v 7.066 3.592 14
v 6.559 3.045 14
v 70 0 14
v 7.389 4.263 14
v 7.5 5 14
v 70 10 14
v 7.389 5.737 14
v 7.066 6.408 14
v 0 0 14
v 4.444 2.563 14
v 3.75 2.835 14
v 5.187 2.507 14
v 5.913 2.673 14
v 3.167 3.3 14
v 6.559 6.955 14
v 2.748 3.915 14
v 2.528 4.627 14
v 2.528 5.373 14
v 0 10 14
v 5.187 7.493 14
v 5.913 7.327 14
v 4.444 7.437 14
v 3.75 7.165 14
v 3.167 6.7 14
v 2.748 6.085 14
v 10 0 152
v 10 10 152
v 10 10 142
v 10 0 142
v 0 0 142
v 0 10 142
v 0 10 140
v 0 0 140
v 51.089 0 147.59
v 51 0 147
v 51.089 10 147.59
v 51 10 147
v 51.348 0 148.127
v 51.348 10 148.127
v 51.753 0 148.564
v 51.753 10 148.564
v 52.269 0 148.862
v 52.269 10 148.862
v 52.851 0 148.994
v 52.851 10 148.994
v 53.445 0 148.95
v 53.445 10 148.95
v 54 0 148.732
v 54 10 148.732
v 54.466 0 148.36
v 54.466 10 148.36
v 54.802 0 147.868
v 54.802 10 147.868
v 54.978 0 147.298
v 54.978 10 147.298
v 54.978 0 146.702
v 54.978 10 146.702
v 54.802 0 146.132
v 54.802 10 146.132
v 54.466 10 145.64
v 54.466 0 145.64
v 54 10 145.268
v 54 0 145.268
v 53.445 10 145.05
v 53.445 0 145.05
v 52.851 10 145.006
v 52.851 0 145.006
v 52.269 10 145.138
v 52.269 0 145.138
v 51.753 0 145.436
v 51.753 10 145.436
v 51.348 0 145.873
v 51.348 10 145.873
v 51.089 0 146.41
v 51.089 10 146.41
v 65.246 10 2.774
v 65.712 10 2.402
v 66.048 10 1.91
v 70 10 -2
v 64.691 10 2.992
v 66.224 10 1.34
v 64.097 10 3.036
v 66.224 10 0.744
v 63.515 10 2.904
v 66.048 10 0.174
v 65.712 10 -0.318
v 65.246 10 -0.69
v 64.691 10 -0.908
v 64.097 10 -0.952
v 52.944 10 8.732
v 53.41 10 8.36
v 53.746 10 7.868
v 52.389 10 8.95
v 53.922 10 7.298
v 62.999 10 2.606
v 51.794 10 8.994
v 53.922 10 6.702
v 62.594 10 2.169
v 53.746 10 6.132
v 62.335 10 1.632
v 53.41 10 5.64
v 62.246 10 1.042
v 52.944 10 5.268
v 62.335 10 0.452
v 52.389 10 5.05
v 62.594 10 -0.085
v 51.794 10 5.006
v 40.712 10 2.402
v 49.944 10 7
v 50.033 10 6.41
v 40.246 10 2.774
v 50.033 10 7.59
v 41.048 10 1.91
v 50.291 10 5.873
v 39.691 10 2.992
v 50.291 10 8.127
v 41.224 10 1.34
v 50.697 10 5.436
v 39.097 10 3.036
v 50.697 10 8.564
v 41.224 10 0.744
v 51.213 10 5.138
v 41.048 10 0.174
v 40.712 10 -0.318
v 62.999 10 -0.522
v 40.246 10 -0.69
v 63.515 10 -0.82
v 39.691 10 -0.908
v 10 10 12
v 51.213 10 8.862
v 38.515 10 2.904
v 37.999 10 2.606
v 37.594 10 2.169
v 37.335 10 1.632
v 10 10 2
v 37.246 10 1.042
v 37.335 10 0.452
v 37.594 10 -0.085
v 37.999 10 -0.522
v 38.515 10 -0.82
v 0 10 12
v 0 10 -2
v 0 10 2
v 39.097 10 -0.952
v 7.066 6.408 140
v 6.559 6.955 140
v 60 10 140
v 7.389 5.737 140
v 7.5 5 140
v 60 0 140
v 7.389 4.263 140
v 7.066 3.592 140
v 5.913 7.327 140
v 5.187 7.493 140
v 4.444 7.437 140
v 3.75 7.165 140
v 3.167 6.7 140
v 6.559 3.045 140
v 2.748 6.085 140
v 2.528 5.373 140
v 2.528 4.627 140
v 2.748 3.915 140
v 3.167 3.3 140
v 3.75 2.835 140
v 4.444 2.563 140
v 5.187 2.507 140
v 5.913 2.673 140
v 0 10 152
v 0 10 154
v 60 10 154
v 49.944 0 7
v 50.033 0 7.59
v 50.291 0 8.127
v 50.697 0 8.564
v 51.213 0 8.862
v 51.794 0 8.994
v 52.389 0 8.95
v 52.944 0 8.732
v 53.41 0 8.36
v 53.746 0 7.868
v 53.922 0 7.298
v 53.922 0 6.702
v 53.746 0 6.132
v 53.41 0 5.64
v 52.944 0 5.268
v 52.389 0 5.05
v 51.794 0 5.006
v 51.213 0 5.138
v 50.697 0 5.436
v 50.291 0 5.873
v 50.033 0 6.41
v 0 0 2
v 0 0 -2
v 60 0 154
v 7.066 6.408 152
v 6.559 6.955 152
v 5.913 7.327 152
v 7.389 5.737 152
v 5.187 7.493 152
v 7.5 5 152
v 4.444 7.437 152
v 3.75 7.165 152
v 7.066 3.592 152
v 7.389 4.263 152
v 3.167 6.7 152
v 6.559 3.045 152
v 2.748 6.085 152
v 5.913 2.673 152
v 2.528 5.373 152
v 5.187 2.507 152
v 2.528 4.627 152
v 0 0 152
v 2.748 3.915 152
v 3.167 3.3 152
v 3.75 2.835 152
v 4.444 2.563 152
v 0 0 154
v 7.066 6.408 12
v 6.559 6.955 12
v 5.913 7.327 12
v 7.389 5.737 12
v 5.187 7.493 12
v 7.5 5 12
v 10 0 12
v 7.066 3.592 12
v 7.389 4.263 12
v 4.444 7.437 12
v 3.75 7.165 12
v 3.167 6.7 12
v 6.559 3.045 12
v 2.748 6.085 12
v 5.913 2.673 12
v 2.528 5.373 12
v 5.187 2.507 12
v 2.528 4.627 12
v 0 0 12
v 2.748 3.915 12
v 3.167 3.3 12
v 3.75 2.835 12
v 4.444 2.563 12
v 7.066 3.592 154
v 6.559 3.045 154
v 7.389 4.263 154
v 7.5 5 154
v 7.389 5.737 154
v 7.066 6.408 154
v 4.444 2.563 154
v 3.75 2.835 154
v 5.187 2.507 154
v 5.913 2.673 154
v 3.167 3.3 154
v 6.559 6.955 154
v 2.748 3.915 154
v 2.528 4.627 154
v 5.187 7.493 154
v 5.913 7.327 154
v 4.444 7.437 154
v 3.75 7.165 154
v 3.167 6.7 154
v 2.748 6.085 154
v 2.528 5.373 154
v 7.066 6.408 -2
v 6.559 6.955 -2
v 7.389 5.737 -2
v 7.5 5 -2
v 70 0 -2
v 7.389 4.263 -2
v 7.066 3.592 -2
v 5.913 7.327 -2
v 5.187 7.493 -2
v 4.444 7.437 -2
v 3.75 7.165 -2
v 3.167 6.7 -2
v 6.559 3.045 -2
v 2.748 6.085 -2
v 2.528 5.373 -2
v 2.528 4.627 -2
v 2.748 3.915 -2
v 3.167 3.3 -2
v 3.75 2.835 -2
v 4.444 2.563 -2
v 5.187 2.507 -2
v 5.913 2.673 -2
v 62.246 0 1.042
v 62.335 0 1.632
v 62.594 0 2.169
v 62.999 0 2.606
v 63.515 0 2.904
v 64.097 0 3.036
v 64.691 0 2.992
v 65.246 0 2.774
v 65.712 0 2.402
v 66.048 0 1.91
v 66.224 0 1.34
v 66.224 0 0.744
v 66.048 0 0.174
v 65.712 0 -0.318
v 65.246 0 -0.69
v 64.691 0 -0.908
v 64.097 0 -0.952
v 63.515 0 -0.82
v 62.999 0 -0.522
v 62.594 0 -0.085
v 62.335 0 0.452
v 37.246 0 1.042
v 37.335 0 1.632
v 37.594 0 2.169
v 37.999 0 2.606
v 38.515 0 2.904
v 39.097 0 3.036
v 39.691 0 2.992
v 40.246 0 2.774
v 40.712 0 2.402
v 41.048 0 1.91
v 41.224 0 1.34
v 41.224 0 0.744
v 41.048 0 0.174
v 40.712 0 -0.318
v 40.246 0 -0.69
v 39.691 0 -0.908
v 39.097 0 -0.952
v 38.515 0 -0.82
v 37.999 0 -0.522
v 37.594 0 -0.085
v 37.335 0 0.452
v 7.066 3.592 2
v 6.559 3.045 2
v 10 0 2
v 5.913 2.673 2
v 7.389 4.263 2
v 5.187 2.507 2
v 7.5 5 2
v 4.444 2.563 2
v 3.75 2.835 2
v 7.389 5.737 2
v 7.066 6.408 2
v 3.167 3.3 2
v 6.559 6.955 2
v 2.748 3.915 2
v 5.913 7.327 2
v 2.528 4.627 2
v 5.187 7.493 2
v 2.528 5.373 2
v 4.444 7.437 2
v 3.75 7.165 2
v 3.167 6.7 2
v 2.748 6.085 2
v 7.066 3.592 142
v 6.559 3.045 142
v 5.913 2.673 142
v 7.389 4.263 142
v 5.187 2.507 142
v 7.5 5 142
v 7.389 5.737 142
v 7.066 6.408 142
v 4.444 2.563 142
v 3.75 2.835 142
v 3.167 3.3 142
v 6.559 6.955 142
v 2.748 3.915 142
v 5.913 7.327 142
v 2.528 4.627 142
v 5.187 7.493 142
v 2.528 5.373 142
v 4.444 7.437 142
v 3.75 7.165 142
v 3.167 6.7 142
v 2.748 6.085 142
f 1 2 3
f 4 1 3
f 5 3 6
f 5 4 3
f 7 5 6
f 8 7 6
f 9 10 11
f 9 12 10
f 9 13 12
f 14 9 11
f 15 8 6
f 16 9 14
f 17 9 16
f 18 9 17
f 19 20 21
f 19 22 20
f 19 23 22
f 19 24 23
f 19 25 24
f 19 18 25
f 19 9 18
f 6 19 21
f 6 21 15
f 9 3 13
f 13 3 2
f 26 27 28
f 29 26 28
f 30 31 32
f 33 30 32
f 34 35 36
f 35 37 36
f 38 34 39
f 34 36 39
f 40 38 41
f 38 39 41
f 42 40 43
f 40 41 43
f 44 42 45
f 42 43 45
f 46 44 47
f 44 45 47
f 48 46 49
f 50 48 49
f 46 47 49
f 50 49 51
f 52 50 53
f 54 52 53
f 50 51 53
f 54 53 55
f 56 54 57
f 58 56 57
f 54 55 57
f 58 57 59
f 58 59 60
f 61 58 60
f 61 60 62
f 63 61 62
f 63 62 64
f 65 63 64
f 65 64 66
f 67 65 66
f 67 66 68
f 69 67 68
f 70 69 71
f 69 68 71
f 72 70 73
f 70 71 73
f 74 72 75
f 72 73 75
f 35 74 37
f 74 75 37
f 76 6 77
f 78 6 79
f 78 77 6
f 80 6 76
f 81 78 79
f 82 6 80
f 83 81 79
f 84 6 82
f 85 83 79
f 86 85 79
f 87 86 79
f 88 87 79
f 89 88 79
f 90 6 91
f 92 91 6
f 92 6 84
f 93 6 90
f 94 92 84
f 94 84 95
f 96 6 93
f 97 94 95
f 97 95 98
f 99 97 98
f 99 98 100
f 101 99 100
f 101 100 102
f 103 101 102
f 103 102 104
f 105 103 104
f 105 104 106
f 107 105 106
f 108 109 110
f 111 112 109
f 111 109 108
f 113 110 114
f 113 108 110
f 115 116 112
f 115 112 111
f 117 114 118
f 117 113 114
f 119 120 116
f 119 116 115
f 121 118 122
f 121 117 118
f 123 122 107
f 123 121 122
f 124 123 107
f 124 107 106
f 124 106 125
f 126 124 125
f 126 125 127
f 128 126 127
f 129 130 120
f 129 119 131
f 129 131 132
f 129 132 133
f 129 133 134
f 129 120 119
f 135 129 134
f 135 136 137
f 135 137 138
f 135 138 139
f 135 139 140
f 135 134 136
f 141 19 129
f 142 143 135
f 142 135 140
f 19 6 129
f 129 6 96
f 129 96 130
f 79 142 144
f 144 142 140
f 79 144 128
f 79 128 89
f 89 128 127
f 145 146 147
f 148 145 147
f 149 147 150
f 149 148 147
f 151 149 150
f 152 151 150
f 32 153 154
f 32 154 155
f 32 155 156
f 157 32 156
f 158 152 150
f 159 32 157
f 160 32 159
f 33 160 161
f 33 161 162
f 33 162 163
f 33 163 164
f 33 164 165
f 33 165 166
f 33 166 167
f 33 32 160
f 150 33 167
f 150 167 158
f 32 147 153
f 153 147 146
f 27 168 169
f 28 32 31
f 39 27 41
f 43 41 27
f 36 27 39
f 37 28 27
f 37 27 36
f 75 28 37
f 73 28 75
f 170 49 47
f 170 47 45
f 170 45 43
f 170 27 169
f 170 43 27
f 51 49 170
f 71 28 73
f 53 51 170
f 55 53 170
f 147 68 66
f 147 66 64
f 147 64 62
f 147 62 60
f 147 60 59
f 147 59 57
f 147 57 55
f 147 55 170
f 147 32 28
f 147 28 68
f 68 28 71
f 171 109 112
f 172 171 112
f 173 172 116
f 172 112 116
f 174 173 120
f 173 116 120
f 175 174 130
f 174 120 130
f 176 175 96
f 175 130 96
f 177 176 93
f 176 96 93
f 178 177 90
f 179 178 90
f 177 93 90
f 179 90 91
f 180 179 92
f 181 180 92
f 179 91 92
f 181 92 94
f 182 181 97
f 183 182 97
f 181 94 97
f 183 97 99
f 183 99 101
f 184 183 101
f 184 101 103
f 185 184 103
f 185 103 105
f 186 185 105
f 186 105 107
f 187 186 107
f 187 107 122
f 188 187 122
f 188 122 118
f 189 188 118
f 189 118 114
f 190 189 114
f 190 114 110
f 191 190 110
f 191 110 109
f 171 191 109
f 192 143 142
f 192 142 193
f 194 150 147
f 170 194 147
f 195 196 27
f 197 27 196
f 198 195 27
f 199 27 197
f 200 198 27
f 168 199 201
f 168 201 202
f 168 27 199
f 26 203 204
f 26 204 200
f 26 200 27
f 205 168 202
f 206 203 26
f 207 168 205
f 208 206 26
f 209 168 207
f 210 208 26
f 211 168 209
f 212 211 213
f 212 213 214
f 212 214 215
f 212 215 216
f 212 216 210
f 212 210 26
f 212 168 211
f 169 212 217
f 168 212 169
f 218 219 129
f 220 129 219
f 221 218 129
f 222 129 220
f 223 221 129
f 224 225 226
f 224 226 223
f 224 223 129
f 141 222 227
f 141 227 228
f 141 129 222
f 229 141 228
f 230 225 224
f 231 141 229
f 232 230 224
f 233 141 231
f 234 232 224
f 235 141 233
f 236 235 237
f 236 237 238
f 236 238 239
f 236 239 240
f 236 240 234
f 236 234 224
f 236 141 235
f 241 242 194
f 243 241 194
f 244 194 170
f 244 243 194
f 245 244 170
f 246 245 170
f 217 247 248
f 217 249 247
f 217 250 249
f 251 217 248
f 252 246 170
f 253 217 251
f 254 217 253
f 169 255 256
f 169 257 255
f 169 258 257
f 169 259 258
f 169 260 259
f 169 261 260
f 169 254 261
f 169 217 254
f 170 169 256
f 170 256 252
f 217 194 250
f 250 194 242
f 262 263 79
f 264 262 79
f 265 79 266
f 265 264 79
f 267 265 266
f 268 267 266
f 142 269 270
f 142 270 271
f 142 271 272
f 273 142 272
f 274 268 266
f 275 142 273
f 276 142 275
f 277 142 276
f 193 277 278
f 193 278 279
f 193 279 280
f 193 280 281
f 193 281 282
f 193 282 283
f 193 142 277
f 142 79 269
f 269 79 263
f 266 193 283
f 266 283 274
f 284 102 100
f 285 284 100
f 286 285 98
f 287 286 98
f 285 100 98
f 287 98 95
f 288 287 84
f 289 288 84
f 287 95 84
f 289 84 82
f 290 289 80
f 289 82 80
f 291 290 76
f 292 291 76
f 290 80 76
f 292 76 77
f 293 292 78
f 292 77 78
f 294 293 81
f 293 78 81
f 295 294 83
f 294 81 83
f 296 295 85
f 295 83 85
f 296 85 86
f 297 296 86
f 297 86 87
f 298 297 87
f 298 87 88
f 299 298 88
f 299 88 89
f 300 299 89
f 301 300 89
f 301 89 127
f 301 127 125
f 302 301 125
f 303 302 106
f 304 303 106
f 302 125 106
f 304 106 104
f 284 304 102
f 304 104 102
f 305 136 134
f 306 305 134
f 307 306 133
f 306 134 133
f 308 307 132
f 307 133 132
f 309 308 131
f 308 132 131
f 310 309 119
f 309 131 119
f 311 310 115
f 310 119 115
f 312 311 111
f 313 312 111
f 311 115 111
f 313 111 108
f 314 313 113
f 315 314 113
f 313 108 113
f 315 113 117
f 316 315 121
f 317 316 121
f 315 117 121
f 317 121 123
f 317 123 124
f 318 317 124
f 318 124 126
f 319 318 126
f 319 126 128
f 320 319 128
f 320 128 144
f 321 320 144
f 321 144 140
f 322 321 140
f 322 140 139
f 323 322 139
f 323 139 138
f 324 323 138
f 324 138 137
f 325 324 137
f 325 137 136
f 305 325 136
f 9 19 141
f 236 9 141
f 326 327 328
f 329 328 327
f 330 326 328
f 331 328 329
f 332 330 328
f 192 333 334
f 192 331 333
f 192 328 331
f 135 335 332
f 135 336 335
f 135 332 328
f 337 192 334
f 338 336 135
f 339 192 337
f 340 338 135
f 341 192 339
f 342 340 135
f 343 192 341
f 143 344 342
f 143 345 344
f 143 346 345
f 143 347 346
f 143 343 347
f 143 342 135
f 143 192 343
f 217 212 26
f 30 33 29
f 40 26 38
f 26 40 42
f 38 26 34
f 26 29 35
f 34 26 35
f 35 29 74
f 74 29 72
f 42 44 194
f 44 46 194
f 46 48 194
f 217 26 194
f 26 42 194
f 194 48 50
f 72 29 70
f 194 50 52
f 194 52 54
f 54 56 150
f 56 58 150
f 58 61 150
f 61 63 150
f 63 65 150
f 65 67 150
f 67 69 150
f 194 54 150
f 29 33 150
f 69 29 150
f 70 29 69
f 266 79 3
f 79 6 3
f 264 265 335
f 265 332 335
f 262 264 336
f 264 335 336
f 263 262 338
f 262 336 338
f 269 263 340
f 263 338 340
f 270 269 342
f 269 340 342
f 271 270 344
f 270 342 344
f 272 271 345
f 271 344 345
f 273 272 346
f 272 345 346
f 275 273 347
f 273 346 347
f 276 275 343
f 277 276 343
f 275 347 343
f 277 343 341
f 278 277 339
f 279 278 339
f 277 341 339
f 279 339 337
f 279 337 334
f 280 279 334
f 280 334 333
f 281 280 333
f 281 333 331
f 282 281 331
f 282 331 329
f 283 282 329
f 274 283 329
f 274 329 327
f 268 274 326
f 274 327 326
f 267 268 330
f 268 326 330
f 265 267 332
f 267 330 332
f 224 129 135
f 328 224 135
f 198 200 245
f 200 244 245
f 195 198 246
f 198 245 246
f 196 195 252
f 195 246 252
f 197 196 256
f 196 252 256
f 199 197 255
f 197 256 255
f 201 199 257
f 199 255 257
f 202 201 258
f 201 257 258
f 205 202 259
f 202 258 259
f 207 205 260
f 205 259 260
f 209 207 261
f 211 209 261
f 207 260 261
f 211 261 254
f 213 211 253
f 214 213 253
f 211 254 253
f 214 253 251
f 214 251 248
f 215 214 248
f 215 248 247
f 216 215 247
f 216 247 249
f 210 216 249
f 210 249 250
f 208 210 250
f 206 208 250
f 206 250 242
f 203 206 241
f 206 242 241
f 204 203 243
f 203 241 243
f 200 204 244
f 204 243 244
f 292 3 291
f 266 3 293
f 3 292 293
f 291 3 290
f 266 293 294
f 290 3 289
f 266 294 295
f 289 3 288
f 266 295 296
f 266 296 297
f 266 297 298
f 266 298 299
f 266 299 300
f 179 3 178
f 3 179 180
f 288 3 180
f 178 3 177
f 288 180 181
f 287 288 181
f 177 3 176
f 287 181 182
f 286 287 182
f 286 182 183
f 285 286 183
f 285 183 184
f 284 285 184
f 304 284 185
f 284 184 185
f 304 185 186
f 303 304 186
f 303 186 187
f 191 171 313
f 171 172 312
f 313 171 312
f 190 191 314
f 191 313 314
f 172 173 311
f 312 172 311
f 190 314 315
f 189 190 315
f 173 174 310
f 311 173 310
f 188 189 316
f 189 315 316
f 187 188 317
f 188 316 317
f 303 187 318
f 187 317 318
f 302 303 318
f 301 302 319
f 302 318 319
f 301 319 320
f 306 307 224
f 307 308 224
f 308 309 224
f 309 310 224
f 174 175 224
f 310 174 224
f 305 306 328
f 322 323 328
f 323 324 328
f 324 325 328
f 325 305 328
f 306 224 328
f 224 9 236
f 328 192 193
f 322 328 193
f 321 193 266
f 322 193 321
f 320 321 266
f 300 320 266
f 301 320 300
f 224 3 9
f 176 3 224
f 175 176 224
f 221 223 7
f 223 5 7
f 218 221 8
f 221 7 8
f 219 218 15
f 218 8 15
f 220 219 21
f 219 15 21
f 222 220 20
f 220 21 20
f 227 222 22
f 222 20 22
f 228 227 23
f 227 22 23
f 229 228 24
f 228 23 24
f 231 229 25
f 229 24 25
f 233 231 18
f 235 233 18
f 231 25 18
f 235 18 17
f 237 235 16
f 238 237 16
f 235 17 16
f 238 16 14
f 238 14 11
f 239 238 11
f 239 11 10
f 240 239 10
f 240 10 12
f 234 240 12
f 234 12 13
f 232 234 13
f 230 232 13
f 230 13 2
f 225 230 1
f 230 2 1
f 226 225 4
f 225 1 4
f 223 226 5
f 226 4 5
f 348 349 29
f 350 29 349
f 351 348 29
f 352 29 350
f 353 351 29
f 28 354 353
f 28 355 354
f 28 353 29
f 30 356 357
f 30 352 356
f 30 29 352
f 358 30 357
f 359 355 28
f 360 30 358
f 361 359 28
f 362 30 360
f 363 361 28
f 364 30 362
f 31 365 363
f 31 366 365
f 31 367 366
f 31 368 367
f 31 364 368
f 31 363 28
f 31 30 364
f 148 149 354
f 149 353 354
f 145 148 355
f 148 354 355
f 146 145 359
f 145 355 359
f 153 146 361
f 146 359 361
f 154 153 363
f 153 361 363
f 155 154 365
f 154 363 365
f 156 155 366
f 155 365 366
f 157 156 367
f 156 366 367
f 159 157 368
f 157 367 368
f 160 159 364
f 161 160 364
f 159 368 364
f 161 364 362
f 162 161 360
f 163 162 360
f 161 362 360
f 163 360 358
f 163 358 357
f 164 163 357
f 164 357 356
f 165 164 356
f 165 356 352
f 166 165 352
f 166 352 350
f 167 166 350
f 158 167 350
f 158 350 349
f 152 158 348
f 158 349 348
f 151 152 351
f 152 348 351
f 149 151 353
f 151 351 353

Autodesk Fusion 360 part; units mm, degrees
sketch "Sketch1" plane through (0, 0, 0) normal (1, 0, 0) x (0, 0, -1)
  line L0 (0, 0) -> (-154, 0)
  line L1 (-154, 0) -> (-154, 10)
  line L2 (-154, 10) -> (0, 10)
  line L3 (0, 10) -> (0, 0)
  line L4 (-154, 10) -> (-140, 10)
  line L5 (-140, 10) -> (-140, 0)
  line L6 (-140, 0) -> (-154, 0)
  line L7 (-154, 0) -> (-154, 10)
  line L8 (0, 10) -> (-14, 10)
  line L9 (-14, 10) -> (-14, 0)
  line L10 (-14, 0) -> (0, 0)
  line L11 (0, 0) -> (0, 10)
  line L12 (-142, 10) -> (-152, 10)
  line L13 (-152, 10) -> (-152, 0)
  line L14 (-152, 0) -> (-142, 0)
  line L15 (-142, 0) -> (-142, 10)
  line L16 (-142, 10) -> (-152, 0) construction
  line L17 (-152, 10) -> (-142, 0) construction
  line L18 (-2, 10) -> (-12, 10)
  line L19 (-12, 10) -> (-12, 0)
  line L20 (-12, 0) -> (-2, 0)
  line L21 (-2, 0) -> (-2, 10)
  line L22 (-2, 10) -> (-12, 0) construction
  line L23 (-12, 10) -> (-2, 0) construction
  point P0 (-147, 5)
  point P1 (-7, 5)
  dimension "d2" = 10
  dimension "d3" = 14
  dimension "d4" = 10
  dimension "d5" = 14
  dimension "d6" = 10
  dimension "d7" = 10
  dimension "d8" = 10
  dimension "d9" = 10
  dimension "d10" = 10
  dimension "d11" = 2
  dimension "d12" = 2
  dimension "d38" = 10
  dimension "d39" = 10
  dimension "d40" = 126
extrude "Extrude1" add sketch "Sketch1" along normal blind 60 makes body 1
extrude "Extrude2" cut sketch "Sketch1" along normal blind 90 contours L0 L2 L5 L9 bodies 1 makes body 2 at (20, 0, 144.6667)
extrude "Extrude3" cut sketch "Sketch1" along normal blind 10 contours L0 L2 L8 L10 L18 L19 L20 L21 | L0 L2 L4 L6 L12 L13 L14 L15 bodies 1 2
sketch "Sketch4" plane through (0, 0, 154) normal (0, 0, 1) x (1, 0, 0)
  line L0 (0, 10) -> (0, 0)
  line L1 (0, 0) -> (60, 0)
  line L2 (60, 0) -> (60, 10)
  line L3 (60, 10) -> (0, 10)
  circle A0 centre (5, 5) radius 2.5
  dimension "d42" = 5
extrude "Extrude9" cut sketch "Sketch4" against normal blind 180 contours A0 bodies 1 2
sketch "Sketch5" plane through (0, 10, 0) normal (0, 1, 0) x (-1, 0, 0)
  line L0 (0, 2) -> (-10, 2)
  line L1 (-10, 2) -> (-10, 12)
  line L2 (-10, 12) -> (0, 12)
  line L3 (0, 12) -> (0, 14)
  line L4 (0, 14) -> (-60, 14)
  line L5 (-60, 14) -> (-60, 0)
  line L6 (-60, 0) -> (0, 0)
  line L7 (0, 0) -> (0, 2)
  circle A0 centre (-51.9439, 7) radius 2
  line L8 (-51.9439, 7) -> (-53, 147)
  circle A1 centre (-53, 147) radius 2
  dimension "d45" = 4
  dimension "d46" = 4
extrude "Extrude10" cut sketch "Sketch5" against normal blind 32 contours A0 | A1 bodies 1 2
extrude "Extrude11" add 1 faces at (42.5, 5, 154) along direction (0, 0, 1) blind 2 on bodies 2 bodies 2
extrude "Extrude12" cut 1 faces at (42.5, 5, 156) along direction (0, 0, -1) blind 2 on bodies 2 bodies 2
extrude "Extrude13" add 1 faces at (42.5, 5, 0) along direction (0, 0, -1) blind 2 on bodies 1 bodies 1
extrude "Extrude14" add 1 faces at (60, 3.3333, 3.3333) along direction (1, 0, 0) blind 10 on bodies 1 bodies 1
sketch "Sketch6" plane through (0, 10, 0) normal (0, 1, 0) x (-1, 0, 0)
  circle A0 centre (-51.9439, 7) radius 2
  line L0 (0, 2) -> (-10, 2)
  line L1 (-10, 2) -> (-10, 12)
  line L2 (-10, 12) -> (0, 12)
  line L3 (0, 12) -> (0, 14)
  line L4 (0, 14) -> (-70, 14)
  line L5 (-70, 14) -> (-70, -2)
  line L6 (-70, -2) -> (0, -2)
  line L7 (0, -2) -> (0, 2)
  line L8 (-70, -2) -> (-60, -2)
  line L9 (-60, -2) -> (-39.246, -2)
  line L10 (-39.246, -2) -> (-39.246, 1.042)
  circle A1 centre (-39.246, 1.042) radius 2
  line L11 (-39.246, 1.042) -> (-64.246, 1.042)
  circle A2 centre (-64.246, 1.042) radius 2
  dimension "d57" = 10
  dimension "d59" = 3.042
  dimension "d60" = 4
  dimension "d61" = 25
  dimension "d62" = 4
  dimension "d65" = 5.754
extrude "Extrude15" cut sketch "Sketch6" against normal blind 32 contours L10 A1 L11 | L10 A1 L11 | A2 bodies 1
